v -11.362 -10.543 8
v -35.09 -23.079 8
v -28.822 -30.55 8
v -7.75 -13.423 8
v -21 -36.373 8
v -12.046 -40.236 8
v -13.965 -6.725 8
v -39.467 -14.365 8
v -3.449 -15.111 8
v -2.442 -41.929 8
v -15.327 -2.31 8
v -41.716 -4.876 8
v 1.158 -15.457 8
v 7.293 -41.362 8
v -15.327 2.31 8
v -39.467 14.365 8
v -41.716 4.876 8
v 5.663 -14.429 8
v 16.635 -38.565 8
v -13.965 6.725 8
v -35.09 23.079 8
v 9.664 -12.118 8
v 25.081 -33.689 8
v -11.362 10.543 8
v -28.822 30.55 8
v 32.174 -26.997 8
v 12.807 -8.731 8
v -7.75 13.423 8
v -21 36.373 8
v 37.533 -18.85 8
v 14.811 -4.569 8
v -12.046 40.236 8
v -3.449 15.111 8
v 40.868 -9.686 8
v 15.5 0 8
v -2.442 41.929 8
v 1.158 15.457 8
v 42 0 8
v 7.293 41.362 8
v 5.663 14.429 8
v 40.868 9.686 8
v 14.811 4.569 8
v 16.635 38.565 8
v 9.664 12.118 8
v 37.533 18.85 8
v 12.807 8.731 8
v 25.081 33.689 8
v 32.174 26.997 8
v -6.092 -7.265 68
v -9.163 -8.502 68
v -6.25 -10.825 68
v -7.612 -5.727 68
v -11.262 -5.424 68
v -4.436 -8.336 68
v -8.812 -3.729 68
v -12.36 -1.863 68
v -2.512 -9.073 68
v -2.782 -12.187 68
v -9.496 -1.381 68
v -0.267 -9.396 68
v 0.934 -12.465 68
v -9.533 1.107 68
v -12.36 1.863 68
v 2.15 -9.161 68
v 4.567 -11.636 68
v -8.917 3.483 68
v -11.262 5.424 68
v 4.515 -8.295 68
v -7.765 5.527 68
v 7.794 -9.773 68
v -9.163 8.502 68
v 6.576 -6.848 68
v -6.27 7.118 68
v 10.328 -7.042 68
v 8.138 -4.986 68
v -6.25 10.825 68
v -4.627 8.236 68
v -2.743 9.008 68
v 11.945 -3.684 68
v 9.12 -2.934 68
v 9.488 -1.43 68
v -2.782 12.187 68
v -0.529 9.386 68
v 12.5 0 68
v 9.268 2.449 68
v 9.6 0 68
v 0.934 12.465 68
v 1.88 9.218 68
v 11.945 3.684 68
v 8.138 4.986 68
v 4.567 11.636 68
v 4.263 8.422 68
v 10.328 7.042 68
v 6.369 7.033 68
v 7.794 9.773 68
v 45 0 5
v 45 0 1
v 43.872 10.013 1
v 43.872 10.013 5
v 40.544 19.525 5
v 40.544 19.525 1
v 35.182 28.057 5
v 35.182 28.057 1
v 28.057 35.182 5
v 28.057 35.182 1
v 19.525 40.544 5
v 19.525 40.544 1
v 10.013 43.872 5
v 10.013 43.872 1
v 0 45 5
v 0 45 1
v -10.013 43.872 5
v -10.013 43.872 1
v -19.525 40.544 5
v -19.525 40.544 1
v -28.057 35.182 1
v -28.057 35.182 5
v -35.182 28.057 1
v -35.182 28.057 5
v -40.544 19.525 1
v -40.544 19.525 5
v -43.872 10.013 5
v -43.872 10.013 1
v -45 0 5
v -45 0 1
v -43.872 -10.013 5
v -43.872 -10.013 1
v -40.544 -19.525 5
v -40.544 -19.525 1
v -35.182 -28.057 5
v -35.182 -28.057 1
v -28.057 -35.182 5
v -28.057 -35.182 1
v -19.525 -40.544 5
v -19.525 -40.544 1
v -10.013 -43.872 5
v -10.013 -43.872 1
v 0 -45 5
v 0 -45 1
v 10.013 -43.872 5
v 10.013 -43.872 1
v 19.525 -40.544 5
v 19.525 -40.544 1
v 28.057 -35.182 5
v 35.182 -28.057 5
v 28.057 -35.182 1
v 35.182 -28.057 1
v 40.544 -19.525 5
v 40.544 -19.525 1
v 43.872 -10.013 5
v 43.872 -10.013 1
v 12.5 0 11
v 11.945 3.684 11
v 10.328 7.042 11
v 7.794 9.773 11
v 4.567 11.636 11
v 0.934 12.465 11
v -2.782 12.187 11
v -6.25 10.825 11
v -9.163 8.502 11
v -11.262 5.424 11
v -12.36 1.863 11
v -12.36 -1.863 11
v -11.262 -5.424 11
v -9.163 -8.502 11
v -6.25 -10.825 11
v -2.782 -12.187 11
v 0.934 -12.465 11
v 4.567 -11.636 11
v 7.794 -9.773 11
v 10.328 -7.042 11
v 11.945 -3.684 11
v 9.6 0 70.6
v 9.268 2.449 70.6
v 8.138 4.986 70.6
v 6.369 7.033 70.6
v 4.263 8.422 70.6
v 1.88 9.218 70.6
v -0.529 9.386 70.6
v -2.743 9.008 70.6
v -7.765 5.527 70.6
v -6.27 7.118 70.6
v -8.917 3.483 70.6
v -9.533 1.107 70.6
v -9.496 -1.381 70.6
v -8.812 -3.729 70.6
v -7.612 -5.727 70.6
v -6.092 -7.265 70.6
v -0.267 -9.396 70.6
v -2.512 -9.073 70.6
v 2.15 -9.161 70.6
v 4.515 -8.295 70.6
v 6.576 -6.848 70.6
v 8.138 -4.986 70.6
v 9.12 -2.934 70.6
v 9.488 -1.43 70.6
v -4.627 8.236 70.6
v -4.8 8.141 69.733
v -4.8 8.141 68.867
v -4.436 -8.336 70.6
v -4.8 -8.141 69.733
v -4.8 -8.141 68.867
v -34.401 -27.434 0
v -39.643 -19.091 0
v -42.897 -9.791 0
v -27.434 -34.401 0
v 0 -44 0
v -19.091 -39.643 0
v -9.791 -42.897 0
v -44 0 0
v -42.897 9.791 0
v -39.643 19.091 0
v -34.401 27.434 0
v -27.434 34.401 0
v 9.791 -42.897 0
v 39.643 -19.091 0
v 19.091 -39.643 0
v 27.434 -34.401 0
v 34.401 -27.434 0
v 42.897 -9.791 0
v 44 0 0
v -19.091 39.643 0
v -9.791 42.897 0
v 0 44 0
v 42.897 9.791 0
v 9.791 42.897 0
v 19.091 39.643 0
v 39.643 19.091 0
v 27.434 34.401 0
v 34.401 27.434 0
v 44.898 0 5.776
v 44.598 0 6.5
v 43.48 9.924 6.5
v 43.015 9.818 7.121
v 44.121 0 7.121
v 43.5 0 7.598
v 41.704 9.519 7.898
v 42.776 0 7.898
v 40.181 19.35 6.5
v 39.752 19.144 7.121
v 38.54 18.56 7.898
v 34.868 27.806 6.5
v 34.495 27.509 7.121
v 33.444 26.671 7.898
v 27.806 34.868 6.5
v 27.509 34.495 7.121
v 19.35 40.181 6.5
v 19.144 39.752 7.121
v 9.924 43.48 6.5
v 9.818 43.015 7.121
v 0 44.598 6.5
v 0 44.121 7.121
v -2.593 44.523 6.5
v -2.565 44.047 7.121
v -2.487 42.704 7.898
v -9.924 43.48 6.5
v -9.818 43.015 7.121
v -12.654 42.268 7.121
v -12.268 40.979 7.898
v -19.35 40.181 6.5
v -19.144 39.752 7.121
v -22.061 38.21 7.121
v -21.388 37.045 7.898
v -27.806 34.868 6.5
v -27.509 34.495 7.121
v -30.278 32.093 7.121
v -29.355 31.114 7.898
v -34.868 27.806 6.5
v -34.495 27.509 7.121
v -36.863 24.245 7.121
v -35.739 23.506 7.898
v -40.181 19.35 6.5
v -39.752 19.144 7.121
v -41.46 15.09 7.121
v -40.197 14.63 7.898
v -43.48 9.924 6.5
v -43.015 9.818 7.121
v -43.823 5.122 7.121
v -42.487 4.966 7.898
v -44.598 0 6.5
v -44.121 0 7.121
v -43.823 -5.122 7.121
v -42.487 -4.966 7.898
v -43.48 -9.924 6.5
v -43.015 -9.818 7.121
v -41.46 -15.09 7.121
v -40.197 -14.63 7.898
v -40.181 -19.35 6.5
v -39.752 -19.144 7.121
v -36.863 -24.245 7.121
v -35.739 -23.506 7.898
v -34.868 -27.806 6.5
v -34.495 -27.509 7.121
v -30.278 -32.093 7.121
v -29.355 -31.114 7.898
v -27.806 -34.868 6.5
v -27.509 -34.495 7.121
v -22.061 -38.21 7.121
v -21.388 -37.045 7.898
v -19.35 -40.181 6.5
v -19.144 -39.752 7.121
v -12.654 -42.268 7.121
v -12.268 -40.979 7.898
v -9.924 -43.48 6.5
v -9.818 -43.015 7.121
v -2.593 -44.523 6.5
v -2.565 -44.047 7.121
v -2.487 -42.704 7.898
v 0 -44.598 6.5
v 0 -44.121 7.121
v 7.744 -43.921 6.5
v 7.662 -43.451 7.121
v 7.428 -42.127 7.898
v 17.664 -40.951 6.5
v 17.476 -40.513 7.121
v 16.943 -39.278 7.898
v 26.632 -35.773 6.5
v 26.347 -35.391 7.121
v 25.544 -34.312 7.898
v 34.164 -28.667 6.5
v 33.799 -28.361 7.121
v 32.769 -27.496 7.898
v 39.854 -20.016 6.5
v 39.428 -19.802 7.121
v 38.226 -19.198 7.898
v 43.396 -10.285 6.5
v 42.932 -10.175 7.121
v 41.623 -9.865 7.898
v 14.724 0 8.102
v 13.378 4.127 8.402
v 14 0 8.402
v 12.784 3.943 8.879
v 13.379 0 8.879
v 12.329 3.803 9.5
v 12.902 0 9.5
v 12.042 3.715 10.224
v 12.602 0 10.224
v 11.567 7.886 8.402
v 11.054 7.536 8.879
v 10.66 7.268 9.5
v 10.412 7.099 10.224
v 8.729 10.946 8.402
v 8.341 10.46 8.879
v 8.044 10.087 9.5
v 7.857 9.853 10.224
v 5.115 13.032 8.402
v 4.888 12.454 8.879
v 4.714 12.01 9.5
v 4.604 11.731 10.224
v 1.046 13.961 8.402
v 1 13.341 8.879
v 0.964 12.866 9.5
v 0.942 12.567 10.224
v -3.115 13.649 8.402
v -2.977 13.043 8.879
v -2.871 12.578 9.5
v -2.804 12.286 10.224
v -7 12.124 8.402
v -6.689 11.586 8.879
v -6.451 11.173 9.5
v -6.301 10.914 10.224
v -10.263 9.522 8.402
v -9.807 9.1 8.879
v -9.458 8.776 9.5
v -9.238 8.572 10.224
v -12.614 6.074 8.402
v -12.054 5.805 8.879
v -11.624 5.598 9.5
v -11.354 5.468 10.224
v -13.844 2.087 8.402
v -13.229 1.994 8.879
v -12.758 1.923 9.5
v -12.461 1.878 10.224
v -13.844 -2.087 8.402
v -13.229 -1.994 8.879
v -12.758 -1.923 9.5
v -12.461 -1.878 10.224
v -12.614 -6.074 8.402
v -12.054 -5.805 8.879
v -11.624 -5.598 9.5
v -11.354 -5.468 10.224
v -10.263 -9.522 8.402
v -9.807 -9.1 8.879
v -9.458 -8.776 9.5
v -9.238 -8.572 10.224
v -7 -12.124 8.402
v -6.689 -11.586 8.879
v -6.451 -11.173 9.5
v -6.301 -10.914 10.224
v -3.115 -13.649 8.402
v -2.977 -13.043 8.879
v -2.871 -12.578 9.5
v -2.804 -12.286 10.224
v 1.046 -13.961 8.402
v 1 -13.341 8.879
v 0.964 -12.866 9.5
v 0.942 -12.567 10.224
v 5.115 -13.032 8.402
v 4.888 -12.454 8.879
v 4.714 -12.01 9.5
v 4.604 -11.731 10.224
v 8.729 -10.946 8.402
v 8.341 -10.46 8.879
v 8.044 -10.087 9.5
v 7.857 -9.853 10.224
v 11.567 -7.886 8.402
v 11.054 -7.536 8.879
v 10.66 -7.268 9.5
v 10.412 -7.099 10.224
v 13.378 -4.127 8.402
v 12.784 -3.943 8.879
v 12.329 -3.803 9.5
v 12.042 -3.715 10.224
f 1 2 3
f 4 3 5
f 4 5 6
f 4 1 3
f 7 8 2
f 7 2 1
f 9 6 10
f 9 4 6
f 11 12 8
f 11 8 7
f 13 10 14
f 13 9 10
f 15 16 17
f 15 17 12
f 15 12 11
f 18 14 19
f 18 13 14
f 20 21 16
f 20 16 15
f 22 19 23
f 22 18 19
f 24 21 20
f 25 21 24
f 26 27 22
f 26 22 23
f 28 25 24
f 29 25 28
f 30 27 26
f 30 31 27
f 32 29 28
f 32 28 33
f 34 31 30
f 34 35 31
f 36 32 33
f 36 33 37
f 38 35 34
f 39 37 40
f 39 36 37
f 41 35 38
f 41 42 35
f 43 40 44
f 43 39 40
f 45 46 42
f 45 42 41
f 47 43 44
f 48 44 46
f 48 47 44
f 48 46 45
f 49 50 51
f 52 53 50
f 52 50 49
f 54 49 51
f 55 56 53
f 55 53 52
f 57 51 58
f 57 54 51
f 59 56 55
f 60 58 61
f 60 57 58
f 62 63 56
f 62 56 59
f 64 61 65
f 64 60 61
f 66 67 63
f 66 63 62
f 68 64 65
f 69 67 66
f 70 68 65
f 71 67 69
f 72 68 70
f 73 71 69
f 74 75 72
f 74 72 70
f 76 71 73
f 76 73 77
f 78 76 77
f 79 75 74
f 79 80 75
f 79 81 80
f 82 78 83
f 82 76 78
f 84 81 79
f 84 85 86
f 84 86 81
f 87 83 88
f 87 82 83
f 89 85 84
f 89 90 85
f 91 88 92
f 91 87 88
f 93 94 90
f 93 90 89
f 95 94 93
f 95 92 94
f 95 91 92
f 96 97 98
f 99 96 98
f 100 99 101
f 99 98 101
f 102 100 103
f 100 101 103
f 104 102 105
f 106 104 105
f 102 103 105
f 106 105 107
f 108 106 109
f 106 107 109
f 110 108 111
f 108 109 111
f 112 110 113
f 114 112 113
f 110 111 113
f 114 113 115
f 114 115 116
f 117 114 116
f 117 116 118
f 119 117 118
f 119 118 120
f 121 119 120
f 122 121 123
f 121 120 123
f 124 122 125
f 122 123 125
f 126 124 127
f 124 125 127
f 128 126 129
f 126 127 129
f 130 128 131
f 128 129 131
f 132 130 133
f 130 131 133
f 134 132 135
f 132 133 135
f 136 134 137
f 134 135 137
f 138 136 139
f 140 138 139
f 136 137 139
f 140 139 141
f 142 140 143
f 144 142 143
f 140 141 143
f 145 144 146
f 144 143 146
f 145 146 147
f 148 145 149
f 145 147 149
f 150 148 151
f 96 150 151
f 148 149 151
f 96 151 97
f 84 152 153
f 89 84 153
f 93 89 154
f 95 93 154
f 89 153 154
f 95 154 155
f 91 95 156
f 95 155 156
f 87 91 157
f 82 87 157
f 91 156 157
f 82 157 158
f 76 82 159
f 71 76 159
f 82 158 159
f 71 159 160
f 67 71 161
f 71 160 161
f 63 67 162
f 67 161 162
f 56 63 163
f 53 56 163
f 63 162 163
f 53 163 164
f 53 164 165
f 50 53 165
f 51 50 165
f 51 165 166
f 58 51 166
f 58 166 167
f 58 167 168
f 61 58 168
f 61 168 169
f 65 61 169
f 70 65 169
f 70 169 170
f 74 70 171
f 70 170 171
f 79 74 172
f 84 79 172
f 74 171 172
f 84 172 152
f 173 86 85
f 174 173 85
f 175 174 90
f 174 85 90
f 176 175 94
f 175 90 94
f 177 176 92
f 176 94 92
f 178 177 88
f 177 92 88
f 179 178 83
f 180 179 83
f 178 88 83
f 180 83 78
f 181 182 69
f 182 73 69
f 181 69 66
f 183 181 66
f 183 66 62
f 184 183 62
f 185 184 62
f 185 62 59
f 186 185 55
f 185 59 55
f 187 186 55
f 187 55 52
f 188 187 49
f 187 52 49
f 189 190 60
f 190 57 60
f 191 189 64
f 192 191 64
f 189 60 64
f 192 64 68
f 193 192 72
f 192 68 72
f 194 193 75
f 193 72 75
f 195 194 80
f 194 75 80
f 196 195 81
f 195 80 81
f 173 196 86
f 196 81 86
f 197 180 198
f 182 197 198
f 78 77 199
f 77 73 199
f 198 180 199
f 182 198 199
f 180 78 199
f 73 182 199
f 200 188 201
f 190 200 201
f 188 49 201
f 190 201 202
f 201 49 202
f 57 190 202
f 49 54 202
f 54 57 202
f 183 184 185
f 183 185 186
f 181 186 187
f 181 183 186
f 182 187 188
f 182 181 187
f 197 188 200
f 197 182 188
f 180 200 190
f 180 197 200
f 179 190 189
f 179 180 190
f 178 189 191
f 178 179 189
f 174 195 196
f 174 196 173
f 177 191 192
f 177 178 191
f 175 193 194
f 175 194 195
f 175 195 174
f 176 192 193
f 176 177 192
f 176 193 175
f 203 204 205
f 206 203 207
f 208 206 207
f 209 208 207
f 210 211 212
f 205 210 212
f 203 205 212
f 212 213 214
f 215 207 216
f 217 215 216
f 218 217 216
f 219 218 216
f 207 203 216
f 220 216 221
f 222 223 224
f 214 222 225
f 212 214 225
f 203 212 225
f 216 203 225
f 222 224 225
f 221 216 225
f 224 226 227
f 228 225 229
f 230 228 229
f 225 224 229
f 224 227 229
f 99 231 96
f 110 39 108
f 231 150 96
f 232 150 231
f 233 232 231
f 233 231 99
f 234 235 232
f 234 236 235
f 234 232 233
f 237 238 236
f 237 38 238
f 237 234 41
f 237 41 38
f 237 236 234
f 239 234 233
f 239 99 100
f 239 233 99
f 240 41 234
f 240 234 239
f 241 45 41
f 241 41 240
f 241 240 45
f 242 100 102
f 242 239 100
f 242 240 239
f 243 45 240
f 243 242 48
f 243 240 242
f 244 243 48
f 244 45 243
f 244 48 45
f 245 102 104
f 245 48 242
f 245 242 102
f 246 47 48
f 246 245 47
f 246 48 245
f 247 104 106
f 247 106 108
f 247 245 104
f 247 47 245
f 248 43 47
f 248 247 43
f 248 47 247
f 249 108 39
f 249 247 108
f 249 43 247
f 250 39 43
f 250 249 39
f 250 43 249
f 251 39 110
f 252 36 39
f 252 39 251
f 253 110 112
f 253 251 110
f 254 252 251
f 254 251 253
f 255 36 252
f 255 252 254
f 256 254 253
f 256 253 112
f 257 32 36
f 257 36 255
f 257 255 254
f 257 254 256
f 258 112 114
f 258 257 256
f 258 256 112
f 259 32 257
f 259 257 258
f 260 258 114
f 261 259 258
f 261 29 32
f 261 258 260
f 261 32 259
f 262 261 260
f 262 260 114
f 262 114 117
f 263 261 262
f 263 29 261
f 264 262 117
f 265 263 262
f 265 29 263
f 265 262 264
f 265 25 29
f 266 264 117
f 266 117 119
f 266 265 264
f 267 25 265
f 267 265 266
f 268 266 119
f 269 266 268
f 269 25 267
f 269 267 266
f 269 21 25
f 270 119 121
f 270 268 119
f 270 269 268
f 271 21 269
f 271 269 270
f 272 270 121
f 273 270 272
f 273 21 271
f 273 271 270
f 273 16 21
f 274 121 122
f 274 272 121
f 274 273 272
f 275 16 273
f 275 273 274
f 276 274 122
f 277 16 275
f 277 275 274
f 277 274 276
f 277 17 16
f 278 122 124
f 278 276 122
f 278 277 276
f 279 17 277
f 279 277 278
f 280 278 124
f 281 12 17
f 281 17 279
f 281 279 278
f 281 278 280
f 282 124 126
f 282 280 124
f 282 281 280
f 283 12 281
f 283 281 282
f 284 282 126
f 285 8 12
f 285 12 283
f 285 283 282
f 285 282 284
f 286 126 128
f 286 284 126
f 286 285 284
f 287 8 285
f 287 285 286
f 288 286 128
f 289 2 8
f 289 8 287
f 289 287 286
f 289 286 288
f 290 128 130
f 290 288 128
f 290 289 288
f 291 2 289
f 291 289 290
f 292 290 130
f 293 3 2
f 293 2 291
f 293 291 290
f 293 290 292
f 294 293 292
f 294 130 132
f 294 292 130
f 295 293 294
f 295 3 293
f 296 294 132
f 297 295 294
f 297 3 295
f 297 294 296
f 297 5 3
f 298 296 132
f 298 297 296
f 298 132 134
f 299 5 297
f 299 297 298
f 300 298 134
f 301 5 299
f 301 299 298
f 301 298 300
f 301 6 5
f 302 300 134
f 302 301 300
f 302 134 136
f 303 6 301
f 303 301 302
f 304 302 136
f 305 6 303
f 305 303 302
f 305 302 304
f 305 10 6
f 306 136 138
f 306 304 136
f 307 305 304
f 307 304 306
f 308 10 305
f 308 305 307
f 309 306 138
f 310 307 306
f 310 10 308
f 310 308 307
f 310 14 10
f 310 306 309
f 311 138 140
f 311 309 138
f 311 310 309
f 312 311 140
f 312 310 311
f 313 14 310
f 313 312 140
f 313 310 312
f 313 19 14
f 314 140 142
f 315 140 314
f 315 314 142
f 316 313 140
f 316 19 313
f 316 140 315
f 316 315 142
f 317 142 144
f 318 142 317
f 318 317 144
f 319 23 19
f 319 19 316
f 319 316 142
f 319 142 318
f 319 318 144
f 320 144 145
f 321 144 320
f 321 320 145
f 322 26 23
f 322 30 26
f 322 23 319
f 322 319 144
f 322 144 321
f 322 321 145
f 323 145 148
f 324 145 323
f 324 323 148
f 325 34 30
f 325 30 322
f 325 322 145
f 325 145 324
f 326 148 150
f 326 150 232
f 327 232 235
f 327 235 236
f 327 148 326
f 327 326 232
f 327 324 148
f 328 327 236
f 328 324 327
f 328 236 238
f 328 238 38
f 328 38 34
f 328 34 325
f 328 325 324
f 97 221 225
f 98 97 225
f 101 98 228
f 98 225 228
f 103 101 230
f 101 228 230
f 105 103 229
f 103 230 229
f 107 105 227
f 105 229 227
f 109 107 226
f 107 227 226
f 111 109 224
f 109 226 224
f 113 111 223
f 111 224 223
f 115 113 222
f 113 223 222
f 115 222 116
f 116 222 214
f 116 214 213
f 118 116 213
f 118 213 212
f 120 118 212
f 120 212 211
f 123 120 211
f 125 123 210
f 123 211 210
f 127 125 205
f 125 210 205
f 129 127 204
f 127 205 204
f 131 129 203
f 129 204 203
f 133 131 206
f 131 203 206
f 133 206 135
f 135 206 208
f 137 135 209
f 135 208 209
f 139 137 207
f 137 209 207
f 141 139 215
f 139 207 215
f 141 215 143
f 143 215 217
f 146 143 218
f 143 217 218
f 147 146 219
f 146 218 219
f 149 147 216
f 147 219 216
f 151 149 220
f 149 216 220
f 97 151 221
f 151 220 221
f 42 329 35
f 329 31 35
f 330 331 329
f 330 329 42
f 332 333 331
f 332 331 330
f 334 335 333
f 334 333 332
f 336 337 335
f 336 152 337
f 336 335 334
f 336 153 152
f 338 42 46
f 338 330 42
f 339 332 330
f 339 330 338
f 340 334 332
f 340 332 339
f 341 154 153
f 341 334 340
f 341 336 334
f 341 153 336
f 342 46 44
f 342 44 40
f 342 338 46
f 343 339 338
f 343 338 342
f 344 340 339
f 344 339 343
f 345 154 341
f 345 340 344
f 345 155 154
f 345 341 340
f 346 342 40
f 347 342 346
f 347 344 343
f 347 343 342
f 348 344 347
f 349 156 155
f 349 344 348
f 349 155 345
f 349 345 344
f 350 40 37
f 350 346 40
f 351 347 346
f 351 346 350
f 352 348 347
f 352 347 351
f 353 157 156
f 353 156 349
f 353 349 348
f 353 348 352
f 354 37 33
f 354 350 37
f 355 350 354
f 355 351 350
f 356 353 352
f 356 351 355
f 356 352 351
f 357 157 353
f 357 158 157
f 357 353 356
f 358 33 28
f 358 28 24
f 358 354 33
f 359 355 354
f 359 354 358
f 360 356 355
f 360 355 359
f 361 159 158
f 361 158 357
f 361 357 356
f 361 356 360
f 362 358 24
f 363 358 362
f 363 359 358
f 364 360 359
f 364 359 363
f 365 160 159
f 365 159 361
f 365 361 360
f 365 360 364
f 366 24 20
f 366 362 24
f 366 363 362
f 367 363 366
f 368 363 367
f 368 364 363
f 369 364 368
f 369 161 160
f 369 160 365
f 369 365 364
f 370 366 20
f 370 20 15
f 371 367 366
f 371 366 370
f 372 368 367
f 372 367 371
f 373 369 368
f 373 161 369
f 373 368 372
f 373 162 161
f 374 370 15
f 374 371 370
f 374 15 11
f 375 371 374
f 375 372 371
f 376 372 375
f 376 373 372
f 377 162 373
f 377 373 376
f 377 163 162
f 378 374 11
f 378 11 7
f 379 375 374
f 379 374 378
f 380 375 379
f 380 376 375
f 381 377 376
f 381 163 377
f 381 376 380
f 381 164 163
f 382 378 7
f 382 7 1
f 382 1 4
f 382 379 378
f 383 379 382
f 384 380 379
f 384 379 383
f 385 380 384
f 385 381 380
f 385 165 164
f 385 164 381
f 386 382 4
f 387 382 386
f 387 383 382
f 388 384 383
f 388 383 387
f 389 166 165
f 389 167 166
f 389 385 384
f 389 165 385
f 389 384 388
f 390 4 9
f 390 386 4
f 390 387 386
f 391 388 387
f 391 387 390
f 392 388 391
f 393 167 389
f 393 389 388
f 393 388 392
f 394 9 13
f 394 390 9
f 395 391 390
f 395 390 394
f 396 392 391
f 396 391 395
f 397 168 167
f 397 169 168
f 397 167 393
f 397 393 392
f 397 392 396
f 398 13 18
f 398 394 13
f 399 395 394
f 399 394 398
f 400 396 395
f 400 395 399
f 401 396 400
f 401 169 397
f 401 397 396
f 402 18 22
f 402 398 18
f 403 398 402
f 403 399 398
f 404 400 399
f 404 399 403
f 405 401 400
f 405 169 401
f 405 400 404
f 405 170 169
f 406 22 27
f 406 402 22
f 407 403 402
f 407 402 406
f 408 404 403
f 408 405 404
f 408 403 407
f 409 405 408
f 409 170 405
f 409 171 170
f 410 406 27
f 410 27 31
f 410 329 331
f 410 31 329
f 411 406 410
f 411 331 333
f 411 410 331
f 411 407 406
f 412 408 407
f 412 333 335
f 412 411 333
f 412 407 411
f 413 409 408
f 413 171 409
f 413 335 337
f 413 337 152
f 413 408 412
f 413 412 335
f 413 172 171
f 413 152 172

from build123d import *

# Parameters (mm, degrees)
SKETCH_R     = 45
PAD_DEPTH    = 8
SKETCH001_R  = 12.5
PAD001_DEPTH = 60
PAD002_DEPTH = 2.6
FILLET_R     = 3
CHAMFER_SIZE = 1


with BuildPart() as part:
    # Sketch → Pad (new body)
    with BuildSketch(Plane.XY):
        Circle(SKETCH_R)
    extrude(amount=PAD_DEPTH)

    # Sketch001 → Pad001 (join)
    with BuildSketch(Plane.XY.offset(8)):
        Circle(SKETCH001_R)
    extrude(amount=PAD001_DEPTH)

    # Sketch002 → Pad002 (join)
    with BuildSketch(Plane.XY.offset(68)):
        with BuildLine():
            add(Edge.make_bspline(
                [(9.6, 0), (9.6, 16.281278), (-4.8, 8.140639), (-19.2, 0), (-4.8, -8.140639), (9.6, -16.281278), (9.6, 0)],
                knots=[0, 0, 0, 2.094395, 2.094395, 4.18879, 4.18879, 6.283185, 6.283185, 6.283185], degree=2, weights=[1, 0.5, 1, 0.5, 1, 0.5, 1]))
        make_face()
    extrude(amount=PAD002_DEPTH)

    # Fillet
    fillet_edges = [part.edges().sort_by_distance(p)[0] for p in [
        (-45, 0, 8),
        (-12.5, 0, 8),
    ]]
    fillet(fillet_edges, radius=FILLET_R)

    # Chamfer
    chamfer_edges = [part.edges().sort_by_distance(p)[0] for p in [
        (-45, 0, 0),
    ]]
    chamfer(chamfer_edges, length=CHAMFER_SIZE)


solid = part.part
